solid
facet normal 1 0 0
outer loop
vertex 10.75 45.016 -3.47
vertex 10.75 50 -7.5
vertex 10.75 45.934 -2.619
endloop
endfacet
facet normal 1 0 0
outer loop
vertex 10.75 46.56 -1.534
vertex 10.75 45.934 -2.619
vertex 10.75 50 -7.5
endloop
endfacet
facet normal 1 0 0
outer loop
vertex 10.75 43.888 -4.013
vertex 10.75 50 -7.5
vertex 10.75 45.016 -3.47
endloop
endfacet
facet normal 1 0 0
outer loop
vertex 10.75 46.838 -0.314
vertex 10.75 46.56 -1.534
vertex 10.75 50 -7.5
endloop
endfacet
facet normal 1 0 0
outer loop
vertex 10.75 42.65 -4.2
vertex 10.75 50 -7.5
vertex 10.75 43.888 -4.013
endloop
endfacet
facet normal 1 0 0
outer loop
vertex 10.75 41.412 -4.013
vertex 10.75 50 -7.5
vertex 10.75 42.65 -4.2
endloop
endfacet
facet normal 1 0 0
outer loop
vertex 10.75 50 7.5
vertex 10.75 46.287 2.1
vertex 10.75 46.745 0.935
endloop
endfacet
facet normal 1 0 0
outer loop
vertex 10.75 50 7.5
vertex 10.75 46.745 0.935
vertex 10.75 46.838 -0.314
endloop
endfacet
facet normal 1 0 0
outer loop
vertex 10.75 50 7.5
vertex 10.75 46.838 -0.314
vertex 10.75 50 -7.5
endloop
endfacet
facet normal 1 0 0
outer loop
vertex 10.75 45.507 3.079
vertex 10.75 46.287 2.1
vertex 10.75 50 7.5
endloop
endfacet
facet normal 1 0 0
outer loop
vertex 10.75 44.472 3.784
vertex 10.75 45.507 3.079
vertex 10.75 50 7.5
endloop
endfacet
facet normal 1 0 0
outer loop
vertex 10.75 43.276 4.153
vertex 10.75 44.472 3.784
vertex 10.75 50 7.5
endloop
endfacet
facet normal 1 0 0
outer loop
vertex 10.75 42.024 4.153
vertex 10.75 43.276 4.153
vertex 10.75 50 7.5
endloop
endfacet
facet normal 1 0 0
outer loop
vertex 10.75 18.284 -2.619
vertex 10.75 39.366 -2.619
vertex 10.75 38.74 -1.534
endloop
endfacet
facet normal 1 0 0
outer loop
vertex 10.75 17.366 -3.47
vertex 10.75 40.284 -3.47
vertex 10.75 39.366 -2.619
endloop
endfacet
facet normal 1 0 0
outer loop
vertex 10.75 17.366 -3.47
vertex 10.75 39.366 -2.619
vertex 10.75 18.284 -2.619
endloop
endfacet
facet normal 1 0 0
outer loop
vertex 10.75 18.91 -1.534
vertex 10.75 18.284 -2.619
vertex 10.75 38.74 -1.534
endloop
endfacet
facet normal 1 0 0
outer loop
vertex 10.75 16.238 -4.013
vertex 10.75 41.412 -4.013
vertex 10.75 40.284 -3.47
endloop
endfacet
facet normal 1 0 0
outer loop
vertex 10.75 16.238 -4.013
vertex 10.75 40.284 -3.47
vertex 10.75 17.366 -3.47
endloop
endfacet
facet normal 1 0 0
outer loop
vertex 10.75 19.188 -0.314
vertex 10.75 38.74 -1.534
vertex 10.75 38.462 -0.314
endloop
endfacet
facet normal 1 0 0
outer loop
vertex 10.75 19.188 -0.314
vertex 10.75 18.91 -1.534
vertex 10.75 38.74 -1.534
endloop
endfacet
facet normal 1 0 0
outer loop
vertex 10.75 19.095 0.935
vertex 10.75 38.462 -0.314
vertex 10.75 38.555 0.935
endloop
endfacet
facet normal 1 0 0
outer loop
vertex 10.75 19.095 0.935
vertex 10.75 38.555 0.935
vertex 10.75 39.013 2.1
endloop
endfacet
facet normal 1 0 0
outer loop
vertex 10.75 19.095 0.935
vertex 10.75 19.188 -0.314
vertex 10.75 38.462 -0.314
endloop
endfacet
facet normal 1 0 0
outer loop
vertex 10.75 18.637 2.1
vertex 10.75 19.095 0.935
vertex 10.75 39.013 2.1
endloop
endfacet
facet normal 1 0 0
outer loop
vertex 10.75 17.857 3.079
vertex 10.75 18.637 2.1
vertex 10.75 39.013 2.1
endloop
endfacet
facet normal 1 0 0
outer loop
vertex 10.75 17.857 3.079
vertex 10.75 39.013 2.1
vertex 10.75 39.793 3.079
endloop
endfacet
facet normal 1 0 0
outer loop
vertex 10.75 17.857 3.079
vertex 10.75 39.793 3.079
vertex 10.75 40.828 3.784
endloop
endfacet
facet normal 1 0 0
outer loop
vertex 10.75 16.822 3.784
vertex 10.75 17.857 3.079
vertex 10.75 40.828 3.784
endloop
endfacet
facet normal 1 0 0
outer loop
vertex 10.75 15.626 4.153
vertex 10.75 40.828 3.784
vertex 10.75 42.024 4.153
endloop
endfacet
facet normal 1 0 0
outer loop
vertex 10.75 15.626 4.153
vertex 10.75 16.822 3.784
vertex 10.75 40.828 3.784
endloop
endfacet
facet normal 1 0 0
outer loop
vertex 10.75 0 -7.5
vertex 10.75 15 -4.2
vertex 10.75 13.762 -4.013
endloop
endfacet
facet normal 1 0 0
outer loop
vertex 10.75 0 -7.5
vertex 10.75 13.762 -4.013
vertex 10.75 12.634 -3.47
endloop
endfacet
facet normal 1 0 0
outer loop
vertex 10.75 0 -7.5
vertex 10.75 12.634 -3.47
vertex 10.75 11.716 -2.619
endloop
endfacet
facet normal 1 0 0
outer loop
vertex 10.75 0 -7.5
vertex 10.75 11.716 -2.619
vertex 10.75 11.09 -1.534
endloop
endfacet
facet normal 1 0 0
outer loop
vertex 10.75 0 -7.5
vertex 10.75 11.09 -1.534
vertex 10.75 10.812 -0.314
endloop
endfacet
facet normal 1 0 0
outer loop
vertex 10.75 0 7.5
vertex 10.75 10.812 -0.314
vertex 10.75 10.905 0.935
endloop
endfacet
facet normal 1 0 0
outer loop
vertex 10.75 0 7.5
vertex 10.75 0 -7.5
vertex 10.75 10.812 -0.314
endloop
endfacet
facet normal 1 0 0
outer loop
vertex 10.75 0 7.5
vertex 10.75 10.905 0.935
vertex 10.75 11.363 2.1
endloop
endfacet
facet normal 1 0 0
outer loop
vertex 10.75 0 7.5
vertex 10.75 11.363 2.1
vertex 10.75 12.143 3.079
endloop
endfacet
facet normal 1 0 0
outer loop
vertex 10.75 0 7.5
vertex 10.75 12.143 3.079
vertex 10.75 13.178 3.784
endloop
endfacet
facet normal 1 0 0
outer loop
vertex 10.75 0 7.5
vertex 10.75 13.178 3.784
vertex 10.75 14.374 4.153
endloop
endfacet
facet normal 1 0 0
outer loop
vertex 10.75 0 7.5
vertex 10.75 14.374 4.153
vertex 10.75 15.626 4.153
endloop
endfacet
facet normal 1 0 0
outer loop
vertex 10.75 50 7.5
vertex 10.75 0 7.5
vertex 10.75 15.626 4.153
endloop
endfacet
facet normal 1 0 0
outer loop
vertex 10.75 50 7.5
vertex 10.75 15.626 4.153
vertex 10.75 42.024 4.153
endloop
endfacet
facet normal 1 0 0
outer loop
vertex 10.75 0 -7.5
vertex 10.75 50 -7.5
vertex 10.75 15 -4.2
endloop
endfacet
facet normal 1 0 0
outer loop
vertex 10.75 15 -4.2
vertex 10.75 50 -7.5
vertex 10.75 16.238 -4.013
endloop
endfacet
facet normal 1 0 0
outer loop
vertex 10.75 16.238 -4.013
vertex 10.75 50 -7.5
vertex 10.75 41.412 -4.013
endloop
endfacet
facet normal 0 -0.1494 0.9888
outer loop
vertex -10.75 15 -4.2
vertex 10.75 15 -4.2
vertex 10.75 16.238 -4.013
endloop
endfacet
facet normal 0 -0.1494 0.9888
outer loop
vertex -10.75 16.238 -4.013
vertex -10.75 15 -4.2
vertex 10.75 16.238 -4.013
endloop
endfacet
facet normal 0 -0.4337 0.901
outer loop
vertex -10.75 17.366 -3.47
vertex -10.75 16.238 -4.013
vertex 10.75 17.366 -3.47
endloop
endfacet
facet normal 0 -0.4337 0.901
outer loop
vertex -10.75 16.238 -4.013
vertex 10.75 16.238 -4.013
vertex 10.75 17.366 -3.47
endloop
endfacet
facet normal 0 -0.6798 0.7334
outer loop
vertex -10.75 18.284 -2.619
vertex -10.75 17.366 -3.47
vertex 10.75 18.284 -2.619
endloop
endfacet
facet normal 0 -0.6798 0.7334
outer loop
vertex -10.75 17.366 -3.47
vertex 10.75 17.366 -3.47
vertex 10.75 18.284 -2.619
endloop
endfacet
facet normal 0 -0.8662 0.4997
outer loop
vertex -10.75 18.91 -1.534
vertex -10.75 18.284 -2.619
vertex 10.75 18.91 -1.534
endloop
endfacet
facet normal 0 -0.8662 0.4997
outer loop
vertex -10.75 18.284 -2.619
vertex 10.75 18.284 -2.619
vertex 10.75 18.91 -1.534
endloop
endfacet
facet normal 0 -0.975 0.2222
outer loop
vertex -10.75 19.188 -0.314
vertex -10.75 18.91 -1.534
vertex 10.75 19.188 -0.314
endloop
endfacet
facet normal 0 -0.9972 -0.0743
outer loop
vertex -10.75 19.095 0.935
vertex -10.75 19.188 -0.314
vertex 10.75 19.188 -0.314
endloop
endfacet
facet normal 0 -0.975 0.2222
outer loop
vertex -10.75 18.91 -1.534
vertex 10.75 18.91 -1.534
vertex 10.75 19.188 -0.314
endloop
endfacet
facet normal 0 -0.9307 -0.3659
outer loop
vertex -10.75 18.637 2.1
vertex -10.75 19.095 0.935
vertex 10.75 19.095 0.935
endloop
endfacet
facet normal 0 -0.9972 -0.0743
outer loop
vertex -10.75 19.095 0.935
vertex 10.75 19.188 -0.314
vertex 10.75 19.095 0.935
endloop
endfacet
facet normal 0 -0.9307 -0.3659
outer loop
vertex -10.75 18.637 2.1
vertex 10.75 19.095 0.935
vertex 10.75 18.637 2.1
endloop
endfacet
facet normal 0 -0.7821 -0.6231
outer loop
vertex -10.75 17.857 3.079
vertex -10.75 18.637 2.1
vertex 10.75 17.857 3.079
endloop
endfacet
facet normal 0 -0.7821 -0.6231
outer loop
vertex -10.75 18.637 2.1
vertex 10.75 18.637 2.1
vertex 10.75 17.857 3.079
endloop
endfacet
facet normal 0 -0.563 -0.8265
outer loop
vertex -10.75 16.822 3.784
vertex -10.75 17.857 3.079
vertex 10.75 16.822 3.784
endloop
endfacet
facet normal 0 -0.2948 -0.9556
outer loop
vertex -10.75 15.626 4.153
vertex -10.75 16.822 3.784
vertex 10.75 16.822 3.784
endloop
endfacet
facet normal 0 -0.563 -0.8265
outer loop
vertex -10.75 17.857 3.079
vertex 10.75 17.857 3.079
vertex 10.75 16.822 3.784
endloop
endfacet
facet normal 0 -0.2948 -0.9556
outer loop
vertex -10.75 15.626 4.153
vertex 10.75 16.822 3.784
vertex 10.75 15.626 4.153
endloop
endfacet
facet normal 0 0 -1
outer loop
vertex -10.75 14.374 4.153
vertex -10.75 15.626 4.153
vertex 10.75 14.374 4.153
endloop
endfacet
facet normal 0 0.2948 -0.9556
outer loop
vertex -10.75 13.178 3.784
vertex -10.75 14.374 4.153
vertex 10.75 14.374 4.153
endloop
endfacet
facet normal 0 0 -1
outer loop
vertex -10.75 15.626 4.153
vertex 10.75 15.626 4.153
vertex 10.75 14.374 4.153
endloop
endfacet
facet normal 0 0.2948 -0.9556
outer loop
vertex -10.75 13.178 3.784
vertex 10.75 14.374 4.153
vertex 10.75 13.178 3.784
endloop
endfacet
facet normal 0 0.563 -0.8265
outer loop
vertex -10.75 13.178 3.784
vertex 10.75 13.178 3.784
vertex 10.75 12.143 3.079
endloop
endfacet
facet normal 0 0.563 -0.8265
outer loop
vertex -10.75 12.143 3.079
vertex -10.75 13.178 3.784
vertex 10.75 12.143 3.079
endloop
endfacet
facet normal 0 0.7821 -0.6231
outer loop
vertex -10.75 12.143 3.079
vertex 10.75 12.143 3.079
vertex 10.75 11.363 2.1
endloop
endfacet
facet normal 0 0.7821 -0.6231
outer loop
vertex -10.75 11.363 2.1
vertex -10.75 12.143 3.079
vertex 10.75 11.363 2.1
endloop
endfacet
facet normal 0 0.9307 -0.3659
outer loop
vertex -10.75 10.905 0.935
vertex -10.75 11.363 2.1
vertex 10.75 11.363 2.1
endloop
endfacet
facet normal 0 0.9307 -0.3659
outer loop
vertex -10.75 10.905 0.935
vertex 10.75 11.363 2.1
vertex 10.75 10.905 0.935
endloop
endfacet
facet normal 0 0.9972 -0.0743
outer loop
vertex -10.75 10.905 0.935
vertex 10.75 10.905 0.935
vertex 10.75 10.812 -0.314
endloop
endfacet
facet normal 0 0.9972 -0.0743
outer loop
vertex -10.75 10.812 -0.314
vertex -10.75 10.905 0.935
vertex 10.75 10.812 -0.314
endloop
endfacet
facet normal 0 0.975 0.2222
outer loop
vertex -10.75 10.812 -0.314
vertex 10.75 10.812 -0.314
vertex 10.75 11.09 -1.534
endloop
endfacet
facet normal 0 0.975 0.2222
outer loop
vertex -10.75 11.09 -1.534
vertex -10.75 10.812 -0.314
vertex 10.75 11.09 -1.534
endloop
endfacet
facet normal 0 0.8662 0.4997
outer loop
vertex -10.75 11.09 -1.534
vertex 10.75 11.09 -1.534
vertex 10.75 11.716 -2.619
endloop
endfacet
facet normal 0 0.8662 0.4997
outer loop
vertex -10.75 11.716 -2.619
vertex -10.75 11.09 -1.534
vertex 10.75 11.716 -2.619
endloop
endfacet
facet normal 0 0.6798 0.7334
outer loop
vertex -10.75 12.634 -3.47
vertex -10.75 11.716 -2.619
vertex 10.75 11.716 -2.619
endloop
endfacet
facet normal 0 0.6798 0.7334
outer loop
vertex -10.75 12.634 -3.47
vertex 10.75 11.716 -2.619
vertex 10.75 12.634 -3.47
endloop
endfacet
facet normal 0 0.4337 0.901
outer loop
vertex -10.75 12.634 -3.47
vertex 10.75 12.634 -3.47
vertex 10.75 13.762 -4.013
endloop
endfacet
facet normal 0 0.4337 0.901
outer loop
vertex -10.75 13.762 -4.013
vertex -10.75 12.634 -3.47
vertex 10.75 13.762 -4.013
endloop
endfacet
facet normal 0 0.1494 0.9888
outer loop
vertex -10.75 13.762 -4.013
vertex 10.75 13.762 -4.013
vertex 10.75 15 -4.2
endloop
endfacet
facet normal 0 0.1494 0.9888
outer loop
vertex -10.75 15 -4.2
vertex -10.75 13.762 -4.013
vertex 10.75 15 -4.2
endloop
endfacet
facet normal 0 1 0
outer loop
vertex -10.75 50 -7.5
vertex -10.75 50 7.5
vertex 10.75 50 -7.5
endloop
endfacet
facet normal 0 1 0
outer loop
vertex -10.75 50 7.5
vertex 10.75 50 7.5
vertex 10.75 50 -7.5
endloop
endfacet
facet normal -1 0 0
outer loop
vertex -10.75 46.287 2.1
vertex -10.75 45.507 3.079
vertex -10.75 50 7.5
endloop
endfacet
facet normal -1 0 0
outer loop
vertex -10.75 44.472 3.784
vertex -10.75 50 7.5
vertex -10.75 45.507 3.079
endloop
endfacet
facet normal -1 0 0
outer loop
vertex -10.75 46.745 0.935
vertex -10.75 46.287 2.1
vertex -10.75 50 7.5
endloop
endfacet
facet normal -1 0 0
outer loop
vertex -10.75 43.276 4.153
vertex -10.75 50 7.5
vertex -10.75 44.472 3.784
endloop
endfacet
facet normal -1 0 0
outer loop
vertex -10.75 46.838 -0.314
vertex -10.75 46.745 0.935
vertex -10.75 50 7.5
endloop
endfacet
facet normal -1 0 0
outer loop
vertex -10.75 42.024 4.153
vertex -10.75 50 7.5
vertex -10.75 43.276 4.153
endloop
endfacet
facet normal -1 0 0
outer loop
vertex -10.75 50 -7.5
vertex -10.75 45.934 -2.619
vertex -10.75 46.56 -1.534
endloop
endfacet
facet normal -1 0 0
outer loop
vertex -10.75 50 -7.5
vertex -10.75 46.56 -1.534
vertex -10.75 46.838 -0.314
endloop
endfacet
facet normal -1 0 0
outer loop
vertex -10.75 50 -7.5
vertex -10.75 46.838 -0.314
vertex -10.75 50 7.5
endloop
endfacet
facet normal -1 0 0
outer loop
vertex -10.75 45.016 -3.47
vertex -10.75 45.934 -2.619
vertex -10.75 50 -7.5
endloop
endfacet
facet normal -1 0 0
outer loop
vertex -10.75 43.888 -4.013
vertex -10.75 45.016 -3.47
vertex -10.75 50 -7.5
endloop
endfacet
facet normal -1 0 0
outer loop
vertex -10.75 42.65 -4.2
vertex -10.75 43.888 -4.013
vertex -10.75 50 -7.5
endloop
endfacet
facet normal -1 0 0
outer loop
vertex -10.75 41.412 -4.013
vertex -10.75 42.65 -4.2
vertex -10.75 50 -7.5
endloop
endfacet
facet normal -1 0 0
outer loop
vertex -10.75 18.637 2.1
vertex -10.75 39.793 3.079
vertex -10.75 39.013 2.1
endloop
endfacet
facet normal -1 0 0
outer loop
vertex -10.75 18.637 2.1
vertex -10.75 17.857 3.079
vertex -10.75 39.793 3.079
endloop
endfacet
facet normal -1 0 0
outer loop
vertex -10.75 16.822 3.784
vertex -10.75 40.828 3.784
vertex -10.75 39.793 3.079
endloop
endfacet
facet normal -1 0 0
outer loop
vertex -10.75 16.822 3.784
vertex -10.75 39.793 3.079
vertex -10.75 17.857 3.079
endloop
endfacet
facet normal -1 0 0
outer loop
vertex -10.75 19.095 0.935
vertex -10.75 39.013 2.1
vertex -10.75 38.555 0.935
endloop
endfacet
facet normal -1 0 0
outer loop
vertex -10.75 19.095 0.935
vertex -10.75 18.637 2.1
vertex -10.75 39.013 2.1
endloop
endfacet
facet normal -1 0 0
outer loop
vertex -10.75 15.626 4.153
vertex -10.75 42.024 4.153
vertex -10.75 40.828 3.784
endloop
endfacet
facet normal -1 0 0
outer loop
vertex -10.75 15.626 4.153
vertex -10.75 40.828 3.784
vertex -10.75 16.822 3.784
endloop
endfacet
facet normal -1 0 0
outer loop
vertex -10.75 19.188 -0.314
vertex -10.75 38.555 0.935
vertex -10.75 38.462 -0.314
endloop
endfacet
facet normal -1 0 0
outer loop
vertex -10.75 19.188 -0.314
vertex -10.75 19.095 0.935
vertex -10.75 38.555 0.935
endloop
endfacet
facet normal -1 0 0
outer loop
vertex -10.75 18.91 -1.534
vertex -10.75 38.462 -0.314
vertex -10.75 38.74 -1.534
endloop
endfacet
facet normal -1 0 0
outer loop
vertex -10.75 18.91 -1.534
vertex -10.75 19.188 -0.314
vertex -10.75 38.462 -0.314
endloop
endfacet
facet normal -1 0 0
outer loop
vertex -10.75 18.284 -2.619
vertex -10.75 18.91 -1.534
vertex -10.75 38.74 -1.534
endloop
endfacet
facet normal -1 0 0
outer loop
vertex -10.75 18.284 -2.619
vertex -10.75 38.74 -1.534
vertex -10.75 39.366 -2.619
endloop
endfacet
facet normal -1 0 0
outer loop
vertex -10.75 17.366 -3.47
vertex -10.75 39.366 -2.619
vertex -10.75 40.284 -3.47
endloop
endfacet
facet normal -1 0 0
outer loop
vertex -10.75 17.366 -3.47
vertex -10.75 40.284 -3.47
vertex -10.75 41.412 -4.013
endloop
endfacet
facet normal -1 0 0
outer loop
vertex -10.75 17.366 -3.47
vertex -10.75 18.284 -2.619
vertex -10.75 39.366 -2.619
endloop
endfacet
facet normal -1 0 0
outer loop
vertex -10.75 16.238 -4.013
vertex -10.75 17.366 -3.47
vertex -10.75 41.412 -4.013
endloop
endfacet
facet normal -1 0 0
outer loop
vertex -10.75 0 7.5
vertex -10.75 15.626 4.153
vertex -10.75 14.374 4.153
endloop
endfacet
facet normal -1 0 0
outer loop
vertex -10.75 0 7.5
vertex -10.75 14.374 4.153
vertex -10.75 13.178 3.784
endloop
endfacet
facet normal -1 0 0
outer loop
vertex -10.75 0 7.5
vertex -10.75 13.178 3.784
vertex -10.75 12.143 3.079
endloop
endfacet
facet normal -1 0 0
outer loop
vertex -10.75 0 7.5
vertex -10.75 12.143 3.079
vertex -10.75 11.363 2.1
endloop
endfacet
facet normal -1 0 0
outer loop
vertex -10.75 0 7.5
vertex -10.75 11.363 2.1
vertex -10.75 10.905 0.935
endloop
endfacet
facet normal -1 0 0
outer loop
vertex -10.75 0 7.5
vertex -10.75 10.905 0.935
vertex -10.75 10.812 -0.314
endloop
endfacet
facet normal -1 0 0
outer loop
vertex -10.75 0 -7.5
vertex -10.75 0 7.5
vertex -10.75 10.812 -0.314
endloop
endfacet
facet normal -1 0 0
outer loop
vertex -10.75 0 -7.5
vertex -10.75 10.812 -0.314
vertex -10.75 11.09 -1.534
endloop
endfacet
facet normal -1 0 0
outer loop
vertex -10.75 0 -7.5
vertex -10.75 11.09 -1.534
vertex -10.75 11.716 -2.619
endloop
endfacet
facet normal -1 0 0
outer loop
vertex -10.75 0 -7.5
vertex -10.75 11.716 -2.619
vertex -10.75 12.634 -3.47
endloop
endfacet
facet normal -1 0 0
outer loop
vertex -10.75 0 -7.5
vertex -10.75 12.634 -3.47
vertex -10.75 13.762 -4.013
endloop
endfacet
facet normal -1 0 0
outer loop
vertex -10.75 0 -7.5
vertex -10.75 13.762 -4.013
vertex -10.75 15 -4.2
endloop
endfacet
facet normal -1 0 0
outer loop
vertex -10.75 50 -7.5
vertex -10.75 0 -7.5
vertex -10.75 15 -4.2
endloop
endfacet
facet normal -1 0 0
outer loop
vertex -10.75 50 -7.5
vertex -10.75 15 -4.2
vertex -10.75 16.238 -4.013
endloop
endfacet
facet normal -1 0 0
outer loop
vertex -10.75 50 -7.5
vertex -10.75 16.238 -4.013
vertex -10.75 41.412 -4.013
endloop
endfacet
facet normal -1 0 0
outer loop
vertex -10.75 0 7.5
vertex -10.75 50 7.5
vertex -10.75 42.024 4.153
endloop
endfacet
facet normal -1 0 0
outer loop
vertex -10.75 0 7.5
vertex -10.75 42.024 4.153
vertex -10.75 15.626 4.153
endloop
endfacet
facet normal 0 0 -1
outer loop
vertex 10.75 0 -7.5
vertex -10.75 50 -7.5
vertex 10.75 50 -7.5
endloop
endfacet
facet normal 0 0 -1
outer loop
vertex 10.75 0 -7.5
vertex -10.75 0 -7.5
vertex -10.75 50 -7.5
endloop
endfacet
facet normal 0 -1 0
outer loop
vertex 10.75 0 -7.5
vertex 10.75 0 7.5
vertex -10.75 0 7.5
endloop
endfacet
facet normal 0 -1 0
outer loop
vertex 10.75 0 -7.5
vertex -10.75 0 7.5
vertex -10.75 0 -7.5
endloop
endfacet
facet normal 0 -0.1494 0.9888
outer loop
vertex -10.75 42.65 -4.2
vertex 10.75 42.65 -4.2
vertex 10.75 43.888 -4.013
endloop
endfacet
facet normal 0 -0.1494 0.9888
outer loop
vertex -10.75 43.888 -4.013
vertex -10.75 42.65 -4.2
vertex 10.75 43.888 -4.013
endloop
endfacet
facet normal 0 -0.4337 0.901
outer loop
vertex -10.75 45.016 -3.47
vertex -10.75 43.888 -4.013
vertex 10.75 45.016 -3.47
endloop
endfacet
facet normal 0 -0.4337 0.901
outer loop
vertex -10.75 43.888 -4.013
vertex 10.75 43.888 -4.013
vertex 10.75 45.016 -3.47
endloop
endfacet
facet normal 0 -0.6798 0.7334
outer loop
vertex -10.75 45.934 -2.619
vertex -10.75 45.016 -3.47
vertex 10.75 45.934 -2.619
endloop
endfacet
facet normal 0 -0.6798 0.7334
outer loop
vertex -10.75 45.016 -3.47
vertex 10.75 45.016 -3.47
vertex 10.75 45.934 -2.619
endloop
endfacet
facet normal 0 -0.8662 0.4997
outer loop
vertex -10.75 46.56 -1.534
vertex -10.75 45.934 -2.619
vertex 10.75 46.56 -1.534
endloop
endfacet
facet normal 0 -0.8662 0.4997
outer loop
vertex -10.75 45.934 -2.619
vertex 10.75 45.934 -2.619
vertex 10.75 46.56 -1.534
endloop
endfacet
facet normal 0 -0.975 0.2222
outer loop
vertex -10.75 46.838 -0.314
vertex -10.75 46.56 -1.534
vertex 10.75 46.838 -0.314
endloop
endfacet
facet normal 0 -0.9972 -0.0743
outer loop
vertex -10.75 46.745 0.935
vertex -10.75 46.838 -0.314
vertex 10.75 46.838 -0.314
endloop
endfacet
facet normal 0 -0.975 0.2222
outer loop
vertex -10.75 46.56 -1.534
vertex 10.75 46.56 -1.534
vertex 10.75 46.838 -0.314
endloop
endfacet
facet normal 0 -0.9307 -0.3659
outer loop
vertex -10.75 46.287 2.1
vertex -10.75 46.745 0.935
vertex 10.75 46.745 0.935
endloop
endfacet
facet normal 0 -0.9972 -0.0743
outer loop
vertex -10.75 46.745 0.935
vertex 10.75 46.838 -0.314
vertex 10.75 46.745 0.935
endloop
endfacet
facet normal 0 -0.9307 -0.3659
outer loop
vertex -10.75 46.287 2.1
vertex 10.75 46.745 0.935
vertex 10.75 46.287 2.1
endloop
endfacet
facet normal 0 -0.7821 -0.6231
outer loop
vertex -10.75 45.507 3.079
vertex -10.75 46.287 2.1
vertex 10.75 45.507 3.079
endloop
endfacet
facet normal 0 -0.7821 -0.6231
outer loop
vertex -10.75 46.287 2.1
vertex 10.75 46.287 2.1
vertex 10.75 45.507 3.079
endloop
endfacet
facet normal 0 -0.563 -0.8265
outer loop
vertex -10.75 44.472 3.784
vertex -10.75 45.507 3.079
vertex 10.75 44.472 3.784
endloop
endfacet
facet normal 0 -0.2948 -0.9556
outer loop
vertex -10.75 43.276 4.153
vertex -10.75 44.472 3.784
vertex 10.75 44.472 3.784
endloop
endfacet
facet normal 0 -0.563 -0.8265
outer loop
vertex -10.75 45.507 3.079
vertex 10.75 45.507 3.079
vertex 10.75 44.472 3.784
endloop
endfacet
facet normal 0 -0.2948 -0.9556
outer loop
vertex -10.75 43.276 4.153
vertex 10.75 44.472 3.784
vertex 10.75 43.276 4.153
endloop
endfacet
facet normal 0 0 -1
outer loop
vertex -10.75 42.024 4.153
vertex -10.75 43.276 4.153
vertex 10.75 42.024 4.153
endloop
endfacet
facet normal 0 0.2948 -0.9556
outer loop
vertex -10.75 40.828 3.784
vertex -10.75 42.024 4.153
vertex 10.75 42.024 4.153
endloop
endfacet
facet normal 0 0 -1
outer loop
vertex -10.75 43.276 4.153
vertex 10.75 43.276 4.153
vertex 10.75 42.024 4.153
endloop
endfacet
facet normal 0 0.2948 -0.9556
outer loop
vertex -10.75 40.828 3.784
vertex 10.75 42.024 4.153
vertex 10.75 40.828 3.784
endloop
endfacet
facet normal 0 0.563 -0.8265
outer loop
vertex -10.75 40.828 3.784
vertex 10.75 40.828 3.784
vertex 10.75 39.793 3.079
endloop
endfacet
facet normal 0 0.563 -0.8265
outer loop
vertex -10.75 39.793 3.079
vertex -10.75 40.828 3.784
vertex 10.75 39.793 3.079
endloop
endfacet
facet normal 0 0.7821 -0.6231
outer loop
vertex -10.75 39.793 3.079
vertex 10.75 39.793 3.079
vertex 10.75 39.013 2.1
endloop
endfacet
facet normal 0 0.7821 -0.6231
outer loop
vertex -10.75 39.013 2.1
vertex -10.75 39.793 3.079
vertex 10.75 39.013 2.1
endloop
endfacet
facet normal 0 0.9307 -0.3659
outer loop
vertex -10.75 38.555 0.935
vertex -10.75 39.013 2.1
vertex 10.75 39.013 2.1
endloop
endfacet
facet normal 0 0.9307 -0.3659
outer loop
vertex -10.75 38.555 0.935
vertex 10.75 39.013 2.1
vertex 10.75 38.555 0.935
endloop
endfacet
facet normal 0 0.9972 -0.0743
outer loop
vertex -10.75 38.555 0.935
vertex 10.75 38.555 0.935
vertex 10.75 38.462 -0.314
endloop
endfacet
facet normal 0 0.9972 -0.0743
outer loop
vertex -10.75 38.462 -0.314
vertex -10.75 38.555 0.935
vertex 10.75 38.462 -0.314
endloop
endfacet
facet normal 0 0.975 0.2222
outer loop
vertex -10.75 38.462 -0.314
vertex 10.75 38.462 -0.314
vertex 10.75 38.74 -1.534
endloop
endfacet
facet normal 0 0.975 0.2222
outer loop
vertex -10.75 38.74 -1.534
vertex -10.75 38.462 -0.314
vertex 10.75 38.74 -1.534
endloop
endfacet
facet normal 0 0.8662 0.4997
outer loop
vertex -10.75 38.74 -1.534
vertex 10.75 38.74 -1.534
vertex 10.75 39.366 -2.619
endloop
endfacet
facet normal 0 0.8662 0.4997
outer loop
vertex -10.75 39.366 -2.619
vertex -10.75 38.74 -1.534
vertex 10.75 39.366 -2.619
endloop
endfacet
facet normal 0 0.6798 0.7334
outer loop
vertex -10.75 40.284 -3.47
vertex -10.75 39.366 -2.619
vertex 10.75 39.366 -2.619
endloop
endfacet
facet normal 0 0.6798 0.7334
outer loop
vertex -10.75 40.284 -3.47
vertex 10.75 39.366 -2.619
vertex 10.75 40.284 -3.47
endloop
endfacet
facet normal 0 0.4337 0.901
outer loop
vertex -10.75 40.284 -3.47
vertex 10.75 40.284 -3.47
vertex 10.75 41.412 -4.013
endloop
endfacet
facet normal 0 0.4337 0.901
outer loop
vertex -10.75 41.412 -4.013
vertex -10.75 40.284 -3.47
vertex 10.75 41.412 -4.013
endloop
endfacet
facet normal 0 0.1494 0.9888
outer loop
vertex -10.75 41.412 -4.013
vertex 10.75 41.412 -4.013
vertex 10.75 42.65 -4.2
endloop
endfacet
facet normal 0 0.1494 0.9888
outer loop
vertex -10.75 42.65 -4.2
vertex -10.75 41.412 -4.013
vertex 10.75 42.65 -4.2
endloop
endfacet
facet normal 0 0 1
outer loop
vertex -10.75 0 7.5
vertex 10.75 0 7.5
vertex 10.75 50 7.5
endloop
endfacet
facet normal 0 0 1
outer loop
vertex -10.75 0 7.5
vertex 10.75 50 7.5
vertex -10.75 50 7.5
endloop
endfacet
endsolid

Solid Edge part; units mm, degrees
sketch "Sketch1" plane through (0, 0, 0) normal (0, -1, 0) x (1, 0, 0)
  line L0 (-10.75, -7.5) -> (10.75, -7.5)
  line L1 (10.75, -7.5) -> (10.75, 7.5)
  line L2 (10.75, 7.5) -> (-10.75, 7.5)
  line L3 (-10.75, 7.5) -> (-10.75, -7.5)
  dimension "D1" = 21.5
  dimension "D2" = 15
extrude "Protrusion1" add sketch "Sketch1" against normal blind 50
hole "Hole_1" at (10.75, 15, 0) direction (-1, 0, 0) diameter 8.4 end up to next
hole "Hole1" at (10.75, 42.65, 0) direction (-1, 0, 0) diameter 8.4 end up to next
